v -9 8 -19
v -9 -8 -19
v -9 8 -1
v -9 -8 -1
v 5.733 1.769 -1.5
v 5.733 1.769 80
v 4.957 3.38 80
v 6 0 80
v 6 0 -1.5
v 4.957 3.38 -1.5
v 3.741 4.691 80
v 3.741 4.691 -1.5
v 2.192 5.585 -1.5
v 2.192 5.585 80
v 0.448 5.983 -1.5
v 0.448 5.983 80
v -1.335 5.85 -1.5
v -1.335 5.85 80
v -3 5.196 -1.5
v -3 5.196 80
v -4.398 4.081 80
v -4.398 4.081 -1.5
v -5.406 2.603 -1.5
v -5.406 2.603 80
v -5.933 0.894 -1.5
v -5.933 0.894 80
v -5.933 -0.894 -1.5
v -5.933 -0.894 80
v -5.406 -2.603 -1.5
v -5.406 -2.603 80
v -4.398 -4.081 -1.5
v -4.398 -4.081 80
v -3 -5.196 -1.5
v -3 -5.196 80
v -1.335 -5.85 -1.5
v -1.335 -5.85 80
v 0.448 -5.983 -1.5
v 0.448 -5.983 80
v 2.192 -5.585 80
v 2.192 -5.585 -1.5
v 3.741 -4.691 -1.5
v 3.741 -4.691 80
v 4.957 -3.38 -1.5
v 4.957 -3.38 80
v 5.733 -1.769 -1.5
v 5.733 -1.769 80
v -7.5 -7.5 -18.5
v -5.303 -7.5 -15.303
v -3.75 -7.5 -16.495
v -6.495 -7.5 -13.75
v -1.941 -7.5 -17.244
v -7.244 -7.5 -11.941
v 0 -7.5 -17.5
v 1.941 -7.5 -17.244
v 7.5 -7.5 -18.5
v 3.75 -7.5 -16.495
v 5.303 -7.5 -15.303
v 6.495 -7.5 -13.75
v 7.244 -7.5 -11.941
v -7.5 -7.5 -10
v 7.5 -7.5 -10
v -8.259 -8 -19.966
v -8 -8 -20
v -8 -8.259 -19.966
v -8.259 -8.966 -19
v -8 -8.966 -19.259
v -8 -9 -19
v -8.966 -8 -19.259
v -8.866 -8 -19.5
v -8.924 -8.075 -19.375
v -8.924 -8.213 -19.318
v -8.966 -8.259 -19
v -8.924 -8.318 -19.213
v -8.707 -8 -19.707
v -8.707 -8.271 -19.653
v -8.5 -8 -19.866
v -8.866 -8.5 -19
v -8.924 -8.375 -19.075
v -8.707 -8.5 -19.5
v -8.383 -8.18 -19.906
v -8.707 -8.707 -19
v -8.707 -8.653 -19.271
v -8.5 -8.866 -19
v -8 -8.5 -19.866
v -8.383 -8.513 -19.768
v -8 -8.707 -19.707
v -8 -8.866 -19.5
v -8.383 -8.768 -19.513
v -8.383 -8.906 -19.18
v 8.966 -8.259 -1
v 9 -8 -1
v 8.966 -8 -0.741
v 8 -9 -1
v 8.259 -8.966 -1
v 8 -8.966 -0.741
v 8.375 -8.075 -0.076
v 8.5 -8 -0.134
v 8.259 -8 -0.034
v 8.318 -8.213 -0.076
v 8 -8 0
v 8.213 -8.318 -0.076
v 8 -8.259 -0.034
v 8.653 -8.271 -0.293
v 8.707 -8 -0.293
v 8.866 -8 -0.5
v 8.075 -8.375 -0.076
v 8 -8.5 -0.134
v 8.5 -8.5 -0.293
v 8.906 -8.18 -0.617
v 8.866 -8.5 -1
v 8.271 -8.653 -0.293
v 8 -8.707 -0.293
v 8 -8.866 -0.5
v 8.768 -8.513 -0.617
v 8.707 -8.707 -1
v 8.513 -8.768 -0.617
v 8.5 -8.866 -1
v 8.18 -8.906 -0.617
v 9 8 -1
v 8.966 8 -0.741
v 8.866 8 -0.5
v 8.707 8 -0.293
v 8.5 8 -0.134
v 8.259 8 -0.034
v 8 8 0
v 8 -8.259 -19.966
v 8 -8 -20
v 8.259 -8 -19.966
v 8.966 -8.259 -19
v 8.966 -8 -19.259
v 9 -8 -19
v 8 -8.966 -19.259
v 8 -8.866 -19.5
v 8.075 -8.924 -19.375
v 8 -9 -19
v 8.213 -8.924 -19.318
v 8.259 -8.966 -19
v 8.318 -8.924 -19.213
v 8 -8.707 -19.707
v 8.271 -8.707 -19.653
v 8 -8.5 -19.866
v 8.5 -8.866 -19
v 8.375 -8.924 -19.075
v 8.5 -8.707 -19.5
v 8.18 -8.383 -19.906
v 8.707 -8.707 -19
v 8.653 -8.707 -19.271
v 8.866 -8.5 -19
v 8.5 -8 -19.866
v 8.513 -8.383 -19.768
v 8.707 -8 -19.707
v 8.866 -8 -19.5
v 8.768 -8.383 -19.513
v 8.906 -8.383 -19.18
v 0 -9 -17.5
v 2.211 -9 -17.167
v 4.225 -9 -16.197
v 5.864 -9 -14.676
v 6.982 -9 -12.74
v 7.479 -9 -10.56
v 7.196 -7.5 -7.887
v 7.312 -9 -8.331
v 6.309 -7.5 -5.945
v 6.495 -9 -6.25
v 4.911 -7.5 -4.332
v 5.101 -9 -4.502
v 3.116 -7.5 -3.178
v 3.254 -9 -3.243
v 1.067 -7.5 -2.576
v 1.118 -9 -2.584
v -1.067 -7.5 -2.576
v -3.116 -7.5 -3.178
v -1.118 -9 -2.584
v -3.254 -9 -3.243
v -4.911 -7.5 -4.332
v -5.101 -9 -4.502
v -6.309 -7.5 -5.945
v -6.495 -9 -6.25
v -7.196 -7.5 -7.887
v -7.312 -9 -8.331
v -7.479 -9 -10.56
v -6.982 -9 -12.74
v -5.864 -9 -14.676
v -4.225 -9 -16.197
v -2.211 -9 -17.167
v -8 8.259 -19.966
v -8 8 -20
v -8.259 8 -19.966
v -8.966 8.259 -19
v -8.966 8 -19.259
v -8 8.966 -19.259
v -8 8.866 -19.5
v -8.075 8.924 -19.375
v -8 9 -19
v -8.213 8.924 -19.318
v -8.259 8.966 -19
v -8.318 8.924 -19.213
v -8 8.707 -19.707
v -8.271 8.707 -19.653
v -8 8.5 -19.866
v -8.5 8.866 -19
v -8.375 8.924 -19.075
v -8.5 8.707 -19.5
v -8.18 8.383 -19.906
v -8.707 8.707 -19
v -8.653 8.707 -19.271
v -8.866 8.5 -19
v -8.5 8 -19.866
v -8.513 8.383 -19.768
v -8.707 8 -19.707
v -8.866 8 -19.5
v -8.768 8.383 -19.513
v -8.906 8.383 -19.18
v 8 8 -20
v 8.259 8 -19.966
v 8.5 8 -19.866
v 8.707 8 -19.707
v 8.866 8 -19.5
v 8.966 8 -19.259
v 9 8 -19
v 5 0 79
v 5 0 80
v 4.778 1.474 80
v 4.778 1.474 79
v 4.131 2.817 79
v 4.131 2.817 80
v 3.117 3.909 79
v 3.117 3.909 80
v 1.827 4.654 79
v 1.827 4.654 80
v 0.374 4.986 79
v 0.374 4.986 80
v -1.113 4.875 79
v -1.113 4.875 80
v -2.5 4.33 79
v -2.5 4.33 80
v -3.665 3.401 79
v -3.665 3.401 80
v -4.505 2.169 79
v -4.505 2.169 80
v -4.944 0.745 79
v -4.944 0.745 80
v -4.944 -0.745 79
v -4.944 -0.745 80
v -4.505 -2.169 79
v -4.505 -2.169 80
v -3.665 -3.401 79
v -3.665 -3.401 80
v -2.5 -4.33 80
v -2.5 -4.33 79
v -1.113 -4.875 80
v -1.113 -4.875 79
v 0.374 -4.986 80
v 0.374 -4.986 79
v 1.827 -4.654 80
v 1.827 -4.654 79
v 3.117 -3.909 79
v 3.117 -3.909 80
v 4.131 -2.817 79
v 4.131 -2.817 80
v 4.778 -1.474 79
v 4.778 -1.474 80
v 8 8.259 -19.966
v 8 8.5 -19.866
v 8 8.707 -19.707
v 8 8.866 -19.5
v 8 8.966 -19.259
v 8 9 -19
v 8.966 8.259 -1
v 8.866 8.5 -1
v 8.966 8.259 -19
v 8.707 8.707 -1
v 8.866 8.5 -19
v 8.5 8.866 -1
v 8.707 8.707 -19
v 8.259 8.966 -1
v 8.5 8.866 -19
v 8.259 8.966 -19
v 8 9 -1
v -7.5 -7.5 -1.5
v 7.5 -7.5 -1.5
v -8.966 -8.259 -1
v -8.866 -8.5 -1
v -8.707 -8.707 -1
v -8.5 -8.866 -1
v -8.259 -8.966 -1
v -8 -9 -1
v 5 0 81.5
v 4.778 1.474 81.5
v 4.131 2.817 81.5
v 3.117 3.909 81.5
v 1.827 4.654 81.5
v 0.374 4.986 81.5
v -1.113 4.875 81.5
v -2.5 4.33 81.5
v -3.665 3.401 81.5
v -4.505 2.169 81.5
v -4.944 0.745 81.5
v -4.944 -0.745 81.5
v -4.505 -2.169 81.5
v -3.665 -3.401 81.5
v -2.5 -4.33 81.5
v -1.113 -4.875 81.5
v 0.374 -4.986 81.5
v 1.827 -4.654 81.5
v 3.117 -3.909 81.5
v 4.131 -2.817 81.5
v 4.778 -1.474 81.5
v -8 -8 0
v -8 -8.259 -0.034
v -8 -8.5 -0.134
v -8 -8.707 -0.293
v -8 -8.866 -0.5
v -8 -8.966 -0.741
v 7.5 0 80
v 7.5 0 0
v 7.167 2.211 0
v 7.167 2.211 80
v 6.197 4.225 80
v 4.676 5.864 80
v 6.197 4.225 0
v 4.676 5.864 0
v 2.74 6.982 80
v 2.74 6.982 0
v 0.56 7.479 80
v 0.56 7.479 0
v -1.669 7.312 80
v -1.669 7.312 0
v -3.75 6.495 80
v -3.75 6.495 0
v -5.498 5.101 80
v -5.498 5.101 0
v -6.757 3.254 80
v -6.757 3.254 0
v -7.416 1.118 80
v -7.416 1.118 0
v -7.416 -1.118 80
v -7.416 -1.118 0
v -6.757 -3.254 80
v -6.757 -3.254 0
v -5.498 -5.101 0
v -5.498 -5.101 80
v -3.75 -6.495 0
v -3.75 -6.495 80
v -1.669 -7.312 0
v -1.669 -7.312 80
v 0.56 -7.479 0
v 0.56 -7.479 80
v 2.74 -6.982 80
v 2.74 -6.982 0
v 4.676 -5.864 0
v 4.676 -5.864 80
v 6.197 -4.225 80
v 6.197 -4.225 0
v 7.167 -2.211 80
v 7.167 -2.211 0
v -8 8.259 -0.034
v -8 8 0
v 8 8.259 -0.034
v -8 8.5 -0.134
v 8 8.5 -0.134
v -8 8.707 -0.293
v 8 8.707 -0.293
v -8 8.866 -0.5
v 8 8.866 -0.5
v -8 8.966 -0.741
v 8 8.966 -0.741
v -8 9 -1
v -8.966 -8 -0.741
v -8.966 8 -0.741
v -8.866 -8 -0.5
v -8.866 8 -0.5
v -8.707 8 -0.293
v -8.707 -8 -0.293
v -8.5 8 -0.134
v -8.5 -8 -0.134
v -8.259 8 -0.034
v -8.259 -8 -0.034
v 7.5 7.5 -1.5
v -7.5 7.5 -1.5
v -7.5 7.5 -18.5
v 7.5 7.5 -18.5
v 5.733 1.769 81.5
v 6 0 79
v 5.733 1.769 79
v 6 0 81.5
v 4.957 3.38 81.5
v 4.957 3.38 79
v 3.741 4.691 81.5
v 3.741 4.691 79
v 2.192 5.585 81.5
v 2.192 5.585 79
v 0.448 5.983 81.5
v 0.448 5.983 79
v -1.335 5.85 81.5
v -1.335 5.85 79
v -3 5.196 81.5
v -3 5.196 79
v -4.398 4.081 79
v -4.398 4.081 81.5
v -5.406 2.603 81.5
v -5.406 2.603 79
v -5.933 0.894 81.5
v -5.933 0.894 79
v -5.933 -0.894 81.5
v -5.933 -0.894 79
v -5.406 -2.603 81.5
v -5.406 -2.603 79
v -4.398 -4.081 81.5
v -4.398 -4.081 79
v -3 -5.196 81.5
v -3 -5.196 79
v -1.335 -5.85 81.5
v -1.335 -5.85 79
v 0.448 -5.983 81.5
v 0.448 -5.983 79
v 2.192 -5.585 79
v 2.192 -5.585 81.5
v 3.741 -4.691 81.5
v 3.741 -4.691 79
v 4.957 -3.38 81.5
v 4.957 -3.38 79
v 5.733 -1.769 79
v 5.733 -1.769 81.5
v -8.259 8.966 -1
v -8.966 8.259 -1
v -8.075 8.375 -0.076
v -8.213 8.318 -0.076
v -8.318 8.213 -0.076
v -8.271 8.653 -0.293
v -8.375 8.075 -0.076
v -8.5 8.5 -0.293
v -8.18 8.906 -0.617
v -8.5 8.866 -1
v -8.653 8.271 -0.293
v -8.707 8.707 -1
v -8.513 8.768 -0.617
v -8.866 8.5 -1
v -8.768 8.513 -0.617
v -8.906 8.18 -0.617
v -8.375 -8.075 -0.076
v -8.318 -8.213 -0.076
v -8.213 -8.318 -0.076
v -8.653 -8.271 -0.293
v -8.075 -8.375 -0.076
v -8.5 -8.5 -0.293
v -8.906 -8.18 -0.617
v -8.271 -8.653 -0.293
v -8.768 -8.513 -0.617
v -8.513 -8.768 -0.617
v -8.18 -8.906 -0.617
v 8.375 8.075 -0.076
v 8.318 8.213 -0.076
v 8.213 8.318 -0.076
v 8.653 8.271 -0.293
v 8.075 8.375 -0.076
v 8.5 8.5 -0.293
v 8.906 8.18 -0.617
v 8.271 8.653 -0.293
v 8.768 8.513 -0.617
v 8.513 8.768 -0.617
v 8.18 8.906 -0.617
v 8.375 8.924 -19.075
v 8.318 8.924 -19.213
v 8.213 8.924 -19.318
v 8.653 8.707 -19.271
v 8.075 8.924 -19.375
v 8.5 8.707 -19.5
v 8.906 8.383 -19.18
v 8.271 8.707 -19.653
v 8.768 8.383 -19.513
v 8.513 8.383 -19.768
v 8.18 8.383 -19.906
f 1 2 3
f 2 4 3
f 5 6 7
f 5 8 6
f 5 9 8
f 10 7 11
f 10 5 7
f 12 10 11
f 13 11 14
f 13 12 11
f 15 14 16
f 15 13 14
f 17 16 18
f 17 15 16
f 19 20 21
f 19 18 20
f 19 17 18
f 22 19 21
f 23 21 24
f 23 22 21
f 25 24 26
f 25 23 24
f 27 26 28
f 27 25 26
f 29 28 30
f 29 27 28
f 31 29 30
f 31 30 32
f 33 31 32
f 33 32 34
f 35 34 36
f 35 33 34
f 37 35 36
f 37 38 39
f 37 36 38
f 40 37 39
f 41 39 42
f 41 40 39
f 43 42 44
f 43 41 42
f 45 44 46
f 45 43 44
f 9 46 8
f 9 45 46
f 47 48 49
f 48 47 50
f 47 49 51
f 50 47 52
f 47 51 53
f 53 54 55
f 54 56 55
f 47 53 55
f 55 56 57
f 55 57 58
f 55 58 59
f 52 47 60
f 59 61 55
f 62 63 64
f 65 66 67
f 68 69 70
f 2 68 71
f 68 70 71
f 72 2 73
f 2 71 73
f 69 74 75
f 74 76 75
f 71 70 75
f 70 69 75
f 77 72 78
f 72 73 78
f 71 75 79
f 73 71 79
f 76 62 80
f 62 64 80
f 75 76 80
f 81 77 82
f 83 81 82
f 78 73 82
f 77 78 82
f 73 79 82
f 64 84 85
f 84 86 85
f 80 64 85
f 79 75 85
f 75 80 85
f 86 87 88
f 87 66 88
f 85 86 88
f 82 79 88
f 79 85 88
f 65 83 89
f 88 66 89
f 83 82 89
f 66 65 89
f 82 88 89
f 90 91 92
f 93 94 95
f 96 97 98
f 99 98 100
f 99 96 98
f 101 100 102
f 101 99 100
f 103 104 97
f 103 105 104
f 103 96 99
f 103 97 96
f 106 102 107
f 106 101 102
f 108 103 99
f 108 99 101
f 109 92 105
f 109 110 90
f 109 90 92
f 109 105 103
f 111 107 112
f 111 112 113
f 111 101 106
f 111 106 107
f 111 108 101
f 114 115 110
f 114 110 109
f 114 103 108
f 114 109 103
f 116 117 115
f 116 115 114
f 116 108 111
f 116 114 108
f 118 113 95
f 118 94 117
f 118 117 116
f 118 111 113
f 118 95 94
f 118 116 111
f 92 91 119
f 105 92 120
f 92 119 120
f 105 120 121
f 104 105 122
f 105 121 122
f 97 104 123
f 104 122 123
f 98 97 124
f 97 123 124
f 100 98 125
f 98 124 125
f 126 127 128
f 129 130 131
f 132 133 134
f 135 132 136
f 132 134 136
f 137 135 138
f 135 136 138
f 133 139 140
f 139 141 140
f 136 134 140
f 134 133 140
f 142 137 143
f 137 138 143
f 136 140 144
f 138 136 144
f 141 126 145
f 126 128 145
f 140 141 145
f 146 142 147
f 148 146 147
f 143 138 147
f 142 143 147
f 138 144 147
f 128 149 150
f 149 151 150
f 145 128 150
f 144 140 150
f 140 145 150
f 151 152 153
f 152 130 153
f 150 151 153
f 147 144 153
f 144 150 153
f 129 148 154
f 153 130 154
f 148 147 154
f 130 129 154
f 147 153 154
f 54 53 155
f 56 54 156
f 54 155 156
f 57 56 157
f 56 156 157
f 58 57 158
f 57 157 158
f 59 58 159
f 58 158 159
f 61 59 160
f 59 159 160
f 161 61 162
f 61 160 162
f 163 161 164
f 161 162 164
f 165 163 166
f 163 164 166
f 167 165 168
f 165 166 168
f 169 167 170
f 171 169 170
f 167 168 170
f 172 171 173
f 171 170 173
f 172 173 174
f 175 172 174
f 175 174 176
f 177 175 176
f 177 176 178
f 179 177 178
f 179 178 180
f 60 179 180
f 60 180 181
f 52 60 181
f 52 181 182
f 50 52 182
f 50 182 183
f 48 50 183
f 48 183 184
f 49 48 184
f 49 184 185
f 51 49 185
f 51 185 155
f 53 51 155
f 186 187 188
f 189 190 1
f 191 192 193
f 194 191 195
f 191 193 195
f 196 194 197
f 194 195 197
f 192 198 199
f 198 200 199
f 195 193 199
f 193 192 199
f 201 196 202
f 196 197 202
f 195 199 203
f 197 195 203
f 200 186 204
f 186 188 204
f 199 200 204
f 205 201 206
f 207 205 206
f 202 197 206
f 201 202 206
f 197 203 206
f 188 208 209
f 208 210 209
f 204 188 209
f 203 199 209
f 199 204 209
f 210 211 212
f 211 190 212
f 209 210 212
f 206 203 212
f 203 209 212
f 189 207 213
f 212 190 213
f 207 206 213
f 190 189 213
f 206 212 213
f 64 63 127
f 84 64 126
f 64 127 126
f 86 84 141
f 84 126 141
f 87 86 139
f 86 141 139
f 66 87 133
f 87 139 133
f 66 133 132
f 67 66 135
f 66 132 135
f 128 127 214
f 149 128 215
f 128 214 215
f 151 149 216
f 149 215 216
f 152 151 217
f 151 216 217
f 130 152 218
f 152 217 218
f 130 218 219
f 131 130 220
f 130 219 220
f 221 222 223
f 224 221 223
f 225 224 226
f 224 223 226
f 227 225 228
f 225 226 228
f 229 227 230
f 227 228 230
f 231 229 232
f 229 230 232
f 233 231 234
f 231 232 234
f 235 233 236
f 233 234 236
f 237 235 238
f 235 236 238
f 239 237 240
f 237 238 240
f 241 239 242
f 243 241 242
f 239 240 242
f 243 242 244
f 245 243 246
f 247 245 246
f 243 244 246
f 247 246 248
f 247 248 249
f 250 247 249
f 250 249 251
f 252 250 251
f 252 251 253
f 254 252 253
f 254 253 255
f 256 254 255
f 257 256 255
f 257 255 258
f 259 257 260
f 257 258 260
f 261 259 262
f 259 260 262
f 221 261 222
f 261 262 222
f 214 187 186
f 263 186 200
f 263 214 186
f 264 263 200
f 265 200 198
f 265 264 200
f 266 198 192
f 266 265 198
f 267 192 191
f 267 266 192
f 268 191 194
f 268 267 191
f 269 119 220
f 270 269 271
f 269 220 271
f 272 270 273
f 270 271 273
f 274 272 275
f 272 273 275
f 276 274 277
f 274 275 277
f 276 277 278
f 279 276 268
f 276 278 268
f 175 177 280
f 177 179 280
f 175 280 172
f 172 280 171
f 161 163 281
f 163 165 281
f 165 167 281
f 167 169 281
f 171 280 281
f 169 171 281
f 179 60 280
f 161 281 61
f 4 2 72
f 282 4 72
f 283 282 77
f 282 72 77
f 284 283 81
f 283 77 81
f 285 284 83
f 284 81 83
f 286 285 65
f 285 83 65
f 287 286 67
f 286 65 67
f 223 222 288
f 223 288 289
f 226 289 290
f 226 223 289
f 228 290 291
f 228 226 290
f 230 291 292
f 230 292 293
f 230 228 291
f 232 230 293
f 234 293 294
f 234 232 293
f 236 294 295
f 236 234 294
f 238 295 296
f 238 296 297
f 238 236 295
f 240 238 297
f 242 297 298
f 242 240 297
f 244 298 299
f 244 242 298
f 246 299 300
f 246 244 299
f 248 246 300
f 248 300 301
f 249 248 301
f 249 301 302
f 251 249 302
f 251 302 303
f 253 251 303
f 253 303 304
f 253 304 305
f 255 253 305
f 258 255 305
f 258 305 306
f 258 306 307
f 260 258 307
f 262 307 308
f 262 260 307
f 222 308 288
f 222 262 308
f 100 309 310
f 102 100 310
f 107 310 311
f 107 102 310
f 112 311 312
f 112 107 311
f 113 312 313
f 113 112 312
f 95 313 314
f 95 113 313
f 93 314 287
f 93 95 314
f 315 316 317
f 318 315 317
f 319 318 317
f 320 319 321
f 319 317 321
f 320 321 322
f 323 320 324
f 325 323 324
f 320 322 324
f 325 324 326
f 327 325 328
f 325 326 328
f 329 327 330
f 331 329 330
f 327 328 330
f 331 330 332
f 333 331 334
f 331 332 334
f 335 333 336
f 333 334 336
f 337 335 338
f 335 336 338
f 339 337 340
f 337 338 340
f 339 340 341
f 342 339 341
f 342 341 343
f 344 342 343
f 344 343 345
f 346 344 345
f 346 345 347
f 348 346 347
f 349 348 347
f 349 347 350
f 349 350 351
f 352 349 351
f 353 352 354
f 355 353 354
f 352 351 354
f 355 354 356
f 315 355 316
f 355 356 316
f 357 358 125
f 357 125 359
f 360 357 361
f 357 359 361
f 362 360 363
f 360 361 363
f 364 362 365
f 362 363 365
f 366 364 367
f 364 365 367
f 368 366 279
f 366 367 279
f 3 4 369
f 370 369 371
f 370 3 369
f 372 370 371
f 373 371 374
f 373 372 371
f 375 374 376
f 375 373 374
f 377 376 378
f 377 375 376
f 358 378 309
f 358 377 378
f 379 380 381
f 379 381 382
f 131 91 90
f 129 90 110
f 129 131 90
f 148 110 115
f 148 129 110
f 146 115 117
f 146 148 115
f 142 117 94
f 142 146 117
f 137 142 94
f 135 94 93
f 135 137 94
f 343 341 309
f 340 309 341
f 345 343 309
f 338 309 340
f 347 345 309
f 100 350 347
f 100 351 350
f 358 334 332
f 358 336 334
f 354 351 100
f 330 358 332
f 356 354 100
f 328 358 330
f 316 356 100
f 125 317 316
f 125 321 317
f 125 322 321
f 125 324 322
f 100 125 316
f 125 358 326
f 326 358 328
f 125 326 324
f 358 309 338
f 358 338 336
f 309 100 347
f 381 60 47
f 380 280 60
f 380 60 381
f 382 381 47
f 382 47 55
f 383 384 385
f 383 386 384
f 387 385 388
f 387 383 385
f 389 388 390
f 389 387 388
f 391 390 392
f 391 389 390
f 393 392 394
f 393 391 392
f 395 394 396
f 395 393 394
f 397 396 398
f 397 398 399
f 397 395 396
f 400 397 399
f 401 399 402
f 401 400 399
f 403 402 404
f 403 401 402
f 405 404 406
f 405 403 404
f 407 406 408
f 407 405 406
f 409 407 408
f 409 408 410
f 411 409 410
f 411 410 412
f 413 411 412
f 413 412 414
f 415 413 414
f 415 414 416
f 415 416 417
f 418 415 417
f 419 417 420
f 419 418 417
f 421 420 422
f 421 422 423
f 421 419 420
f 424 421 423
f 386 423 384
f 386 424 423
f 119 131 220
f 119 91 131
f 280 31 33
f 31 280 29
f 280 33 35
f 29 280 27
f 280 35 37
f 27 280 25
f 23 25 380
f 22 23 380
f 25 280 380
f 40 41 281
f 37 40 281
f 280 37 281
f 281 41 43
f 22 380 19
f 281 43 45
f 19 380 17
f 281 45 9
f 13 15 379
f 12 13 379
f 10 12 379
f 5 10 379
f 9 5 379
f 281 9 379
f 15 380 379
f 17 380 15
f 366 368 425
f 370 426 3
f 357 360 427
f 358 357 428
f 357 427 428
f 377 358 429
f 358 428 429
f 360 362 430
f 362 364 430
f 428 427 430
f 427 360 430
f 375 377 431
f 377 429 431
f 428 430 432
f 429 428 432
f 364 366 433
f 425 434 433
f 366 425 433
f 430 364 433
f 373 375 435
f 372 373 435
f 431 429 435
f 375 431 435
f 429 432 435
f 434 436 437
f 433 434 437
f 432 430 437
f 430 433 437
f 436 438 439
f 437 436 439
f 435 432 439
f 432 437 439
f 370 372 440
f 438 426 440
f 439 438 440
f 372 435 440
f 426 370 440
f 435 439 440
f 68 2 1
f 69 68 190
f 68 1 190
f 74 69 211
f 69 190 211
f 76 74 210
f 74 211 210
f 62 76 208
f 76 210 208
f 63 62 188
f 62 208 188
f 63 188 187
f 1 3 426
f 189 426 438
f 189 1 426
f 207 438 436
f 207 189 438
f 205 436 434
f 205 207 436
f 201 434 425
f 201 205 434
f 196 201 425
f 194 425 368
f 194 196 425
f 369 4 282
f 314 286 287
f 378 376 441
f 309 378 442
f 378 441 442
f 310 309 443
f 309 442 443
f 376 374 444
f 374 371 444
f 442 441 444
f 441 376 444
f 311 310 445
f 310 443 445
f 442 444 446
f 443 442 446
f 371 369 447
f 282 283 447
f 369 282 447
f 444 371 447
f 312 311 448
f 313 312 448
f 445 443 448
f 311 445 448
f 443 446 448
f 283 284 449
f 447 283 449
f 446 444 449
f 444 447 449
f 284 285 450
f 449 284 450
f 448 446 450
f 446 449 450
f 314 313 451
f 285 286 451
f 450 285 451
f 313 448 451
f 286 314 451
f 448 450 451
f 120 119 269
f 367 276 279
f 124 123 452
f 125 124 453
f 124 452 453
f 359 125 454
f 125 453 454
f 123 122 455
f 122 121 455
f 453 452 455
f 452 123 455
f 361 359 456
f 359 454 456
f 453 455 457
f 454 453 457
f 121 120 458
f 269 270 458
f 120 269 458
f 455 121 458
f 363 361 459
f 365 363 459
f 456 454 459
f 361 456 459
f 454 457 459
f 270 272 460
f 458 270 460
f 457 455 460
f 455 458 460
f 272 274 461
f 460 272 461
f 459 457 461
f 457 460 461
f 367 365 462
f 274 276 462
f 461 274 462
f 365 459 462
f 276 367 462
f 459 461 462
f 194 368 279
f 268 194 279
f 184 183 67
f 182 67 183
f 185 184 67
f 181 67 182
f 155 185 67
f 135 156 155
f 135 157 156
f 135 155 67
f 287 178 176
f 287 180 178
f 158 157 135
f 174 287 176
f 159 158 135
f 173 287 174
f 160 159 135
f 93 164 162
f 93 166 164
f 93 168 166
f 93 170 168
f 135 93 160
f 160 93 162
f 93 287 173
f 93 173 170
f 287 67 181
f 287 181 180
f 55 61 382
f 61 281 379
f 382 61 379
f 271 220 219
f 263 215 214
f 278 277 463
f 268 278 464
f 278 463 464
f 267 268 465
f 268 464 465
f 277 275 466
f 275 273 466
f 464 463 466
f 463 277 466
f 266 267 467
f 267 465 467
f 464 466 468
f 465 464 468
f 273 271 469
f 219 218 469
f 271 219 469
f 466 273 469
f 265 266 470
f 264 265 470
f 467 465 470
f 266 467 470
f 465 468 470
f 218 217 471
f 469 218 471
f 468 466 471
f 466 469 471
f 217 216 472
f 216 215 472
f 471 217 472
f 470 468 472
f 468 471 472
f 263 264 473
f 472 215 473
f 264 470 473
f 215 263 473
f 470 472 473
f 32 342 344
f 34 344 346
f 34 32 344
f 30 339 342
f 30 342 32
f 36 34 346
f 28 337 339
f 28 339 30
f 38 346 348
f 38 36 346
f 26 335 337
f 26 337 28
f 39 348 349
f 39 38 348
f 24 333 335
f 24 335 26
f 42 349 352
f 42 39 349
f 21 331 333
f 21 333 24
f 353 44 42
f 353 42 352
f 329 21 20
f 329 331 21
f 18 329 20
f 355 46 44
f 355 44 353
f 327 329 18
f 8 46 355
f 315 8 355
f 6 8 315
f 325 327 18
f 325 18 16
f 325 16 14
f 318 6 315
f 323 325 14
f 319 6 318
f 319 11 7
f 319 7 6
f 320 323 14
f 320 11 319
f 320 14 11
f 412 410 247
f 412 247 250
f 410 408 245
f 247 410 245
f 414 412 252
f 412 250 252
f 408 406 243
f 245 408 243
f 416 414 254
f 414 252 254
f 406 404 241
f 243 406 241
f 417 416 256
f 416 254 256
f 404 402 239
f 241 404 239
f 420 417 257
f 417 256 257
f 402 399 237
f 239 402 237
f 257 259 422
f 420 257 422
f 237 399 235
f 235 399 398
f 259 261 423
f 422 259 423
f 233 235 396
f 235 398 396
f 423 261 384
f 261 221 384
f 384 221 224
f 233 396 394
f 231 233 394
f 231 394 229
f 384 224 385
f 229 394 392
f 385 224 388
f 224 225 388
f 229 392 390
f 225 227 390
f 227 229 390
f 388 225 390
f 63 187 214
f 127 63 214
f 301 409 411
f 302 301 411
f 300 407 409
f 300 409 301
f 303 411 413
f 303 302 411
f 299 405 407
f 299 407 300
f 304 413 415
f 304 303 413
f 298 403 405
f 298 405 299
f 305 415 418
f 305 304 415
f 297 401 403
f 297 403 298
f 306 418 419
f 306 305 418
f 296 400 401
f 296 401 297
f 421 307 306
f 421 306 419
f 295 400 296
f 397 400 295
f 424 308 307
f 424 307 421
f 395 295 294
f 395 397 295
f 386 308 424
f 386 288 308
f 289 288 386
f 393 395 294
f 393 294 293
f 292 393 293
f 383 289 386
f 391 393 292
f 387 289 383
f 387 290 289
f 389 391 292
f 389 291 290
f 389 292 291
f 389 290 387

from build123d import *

# Parameters (mm, degrees)
SKETCH_1_R            = 7.5
EXTRUDE_1_DEPTH       = 80
SHELL_3_T             = -1.5
SKETCH_18_W           = 18
SKETCH_18_H           = 18
EXTRUDE_10_DEPTH      = 20
SKETCH_19_W           = 15
SKETCH_19_H           = 15
CUT_EXTRUDE_5_DEPTH   = 17
SKETCH_22_R           = 7.5
CUT_EXTRUDE_7_DEPTH   = 1.5
SKETCH_4_R            = 6
SKETCH_4_R_2          = 5
EXTRUDE_11_DEPTH      = 1.5
EXTRUDE_11_DEPTH_BACK = 1
SKETCH_23_R           = 6
CUT_EXTRUDE_8_DEPTH   = 3
FILLET_2_R            = 1


with BuildPart() as part:
    # 草图1 → 凸台-拉伸1 (new body)
    with BuildSketch(Plane.XY):
        Circle(SKETCH_1_R)
    extrude(amount=EXTRUDE_1_DEPTH)

    # 抽壳3
    shell_3_openings = [part.faces().sort_by_distance(p)[0] for p in [
        (0, 0, 80),
        (0, 0, 0),
    ]]
    offset(amount=SHELL_3_T, openings=shell_3_openings, kind=Kind.INTERSECTION)

    # 草图18 → 凸台-拉伸10 (add)
    with BuildSketch(Plane.XY):
        Rectangle(SKETCH_18_W, SKETCH_18_H)
    extrude(amount=-EXTRUDE_10_DEPTH)

    # 草图19 → 切除-拉伸5 (cut)
    with BuildSketch(Plane.XY.offset(-1.5)):
        Rectangle(SKETCH_19_W, SKETCH_19_H)
    extrude(amount=-CUT_EXTRUDE_5_DEPTH, mode=Mode.SUBTRACT)

    # 草图22 → 切除-拉伸7 (cut)
    with BuildSketch(Plane(origin=(0, -9, 0), x_dir=(-1, 0, 0), z_dir=(0, -1, 0))):
        with Locations(Location((0, 10, 0), (0, 0, 90))):
            Circle(SKETCH_22_R)
    extrude(amount=-CUT_EXTRUDE_7_DEPTH, mode=Mode.SUBTRACT)

    # 草图23 → 切除-拉伸8 (cut)
    with BuildSketch(Plane(origin=(0, 0, -1.5), x_dir=(-1, 0, 0), z_dir=(0, 0, -1))):
        with Locations(Location((0, 0, 0), (0, 0, 180))):
            Circle(SKETCH_23_R)
    extrude(amount=-CUT_EXTRUDE_8_DEPTH, mode=Mode.SUBTRACT)

    # 圆角2
    fillet_2_edges = [part.edges().sort_by_distance(p)[0] for p in [
        (9, 0, -20),
        (9, 9, -10),
        (0, -9, -20),
        (9, -9, -10),
        (-9, 0, -20),
        (-9, -9, -10),
        (0, 9, -20),
        (-9, 9, -10),
        (9, 0, 0),
        (0, 9, 0),
        (-9, 0, 0),
        (0, -9, 0),
    ]]
    fillet(fillet_2_edges, radius=FILLET_2_R)


with BuildPart() as body_2:
    # 草图4 → 凸台-拉伸11 (new, two sides)
    with BuildSketch(Plane.XY.offset(80)) as extrude_11_sk:
        Circle(SKETCH_4_R)
        Circle(SKETCH_4_R_2, mode=Mode.SUBTRACT)
    extrude(amount=EXTRUDE_11_DEPTH)
    extrude(extrude_11_sk.sketch, amount=-EXTRUDE_11_DEPTH_BACK)


solid = Compound([part.part, body_2.part])
